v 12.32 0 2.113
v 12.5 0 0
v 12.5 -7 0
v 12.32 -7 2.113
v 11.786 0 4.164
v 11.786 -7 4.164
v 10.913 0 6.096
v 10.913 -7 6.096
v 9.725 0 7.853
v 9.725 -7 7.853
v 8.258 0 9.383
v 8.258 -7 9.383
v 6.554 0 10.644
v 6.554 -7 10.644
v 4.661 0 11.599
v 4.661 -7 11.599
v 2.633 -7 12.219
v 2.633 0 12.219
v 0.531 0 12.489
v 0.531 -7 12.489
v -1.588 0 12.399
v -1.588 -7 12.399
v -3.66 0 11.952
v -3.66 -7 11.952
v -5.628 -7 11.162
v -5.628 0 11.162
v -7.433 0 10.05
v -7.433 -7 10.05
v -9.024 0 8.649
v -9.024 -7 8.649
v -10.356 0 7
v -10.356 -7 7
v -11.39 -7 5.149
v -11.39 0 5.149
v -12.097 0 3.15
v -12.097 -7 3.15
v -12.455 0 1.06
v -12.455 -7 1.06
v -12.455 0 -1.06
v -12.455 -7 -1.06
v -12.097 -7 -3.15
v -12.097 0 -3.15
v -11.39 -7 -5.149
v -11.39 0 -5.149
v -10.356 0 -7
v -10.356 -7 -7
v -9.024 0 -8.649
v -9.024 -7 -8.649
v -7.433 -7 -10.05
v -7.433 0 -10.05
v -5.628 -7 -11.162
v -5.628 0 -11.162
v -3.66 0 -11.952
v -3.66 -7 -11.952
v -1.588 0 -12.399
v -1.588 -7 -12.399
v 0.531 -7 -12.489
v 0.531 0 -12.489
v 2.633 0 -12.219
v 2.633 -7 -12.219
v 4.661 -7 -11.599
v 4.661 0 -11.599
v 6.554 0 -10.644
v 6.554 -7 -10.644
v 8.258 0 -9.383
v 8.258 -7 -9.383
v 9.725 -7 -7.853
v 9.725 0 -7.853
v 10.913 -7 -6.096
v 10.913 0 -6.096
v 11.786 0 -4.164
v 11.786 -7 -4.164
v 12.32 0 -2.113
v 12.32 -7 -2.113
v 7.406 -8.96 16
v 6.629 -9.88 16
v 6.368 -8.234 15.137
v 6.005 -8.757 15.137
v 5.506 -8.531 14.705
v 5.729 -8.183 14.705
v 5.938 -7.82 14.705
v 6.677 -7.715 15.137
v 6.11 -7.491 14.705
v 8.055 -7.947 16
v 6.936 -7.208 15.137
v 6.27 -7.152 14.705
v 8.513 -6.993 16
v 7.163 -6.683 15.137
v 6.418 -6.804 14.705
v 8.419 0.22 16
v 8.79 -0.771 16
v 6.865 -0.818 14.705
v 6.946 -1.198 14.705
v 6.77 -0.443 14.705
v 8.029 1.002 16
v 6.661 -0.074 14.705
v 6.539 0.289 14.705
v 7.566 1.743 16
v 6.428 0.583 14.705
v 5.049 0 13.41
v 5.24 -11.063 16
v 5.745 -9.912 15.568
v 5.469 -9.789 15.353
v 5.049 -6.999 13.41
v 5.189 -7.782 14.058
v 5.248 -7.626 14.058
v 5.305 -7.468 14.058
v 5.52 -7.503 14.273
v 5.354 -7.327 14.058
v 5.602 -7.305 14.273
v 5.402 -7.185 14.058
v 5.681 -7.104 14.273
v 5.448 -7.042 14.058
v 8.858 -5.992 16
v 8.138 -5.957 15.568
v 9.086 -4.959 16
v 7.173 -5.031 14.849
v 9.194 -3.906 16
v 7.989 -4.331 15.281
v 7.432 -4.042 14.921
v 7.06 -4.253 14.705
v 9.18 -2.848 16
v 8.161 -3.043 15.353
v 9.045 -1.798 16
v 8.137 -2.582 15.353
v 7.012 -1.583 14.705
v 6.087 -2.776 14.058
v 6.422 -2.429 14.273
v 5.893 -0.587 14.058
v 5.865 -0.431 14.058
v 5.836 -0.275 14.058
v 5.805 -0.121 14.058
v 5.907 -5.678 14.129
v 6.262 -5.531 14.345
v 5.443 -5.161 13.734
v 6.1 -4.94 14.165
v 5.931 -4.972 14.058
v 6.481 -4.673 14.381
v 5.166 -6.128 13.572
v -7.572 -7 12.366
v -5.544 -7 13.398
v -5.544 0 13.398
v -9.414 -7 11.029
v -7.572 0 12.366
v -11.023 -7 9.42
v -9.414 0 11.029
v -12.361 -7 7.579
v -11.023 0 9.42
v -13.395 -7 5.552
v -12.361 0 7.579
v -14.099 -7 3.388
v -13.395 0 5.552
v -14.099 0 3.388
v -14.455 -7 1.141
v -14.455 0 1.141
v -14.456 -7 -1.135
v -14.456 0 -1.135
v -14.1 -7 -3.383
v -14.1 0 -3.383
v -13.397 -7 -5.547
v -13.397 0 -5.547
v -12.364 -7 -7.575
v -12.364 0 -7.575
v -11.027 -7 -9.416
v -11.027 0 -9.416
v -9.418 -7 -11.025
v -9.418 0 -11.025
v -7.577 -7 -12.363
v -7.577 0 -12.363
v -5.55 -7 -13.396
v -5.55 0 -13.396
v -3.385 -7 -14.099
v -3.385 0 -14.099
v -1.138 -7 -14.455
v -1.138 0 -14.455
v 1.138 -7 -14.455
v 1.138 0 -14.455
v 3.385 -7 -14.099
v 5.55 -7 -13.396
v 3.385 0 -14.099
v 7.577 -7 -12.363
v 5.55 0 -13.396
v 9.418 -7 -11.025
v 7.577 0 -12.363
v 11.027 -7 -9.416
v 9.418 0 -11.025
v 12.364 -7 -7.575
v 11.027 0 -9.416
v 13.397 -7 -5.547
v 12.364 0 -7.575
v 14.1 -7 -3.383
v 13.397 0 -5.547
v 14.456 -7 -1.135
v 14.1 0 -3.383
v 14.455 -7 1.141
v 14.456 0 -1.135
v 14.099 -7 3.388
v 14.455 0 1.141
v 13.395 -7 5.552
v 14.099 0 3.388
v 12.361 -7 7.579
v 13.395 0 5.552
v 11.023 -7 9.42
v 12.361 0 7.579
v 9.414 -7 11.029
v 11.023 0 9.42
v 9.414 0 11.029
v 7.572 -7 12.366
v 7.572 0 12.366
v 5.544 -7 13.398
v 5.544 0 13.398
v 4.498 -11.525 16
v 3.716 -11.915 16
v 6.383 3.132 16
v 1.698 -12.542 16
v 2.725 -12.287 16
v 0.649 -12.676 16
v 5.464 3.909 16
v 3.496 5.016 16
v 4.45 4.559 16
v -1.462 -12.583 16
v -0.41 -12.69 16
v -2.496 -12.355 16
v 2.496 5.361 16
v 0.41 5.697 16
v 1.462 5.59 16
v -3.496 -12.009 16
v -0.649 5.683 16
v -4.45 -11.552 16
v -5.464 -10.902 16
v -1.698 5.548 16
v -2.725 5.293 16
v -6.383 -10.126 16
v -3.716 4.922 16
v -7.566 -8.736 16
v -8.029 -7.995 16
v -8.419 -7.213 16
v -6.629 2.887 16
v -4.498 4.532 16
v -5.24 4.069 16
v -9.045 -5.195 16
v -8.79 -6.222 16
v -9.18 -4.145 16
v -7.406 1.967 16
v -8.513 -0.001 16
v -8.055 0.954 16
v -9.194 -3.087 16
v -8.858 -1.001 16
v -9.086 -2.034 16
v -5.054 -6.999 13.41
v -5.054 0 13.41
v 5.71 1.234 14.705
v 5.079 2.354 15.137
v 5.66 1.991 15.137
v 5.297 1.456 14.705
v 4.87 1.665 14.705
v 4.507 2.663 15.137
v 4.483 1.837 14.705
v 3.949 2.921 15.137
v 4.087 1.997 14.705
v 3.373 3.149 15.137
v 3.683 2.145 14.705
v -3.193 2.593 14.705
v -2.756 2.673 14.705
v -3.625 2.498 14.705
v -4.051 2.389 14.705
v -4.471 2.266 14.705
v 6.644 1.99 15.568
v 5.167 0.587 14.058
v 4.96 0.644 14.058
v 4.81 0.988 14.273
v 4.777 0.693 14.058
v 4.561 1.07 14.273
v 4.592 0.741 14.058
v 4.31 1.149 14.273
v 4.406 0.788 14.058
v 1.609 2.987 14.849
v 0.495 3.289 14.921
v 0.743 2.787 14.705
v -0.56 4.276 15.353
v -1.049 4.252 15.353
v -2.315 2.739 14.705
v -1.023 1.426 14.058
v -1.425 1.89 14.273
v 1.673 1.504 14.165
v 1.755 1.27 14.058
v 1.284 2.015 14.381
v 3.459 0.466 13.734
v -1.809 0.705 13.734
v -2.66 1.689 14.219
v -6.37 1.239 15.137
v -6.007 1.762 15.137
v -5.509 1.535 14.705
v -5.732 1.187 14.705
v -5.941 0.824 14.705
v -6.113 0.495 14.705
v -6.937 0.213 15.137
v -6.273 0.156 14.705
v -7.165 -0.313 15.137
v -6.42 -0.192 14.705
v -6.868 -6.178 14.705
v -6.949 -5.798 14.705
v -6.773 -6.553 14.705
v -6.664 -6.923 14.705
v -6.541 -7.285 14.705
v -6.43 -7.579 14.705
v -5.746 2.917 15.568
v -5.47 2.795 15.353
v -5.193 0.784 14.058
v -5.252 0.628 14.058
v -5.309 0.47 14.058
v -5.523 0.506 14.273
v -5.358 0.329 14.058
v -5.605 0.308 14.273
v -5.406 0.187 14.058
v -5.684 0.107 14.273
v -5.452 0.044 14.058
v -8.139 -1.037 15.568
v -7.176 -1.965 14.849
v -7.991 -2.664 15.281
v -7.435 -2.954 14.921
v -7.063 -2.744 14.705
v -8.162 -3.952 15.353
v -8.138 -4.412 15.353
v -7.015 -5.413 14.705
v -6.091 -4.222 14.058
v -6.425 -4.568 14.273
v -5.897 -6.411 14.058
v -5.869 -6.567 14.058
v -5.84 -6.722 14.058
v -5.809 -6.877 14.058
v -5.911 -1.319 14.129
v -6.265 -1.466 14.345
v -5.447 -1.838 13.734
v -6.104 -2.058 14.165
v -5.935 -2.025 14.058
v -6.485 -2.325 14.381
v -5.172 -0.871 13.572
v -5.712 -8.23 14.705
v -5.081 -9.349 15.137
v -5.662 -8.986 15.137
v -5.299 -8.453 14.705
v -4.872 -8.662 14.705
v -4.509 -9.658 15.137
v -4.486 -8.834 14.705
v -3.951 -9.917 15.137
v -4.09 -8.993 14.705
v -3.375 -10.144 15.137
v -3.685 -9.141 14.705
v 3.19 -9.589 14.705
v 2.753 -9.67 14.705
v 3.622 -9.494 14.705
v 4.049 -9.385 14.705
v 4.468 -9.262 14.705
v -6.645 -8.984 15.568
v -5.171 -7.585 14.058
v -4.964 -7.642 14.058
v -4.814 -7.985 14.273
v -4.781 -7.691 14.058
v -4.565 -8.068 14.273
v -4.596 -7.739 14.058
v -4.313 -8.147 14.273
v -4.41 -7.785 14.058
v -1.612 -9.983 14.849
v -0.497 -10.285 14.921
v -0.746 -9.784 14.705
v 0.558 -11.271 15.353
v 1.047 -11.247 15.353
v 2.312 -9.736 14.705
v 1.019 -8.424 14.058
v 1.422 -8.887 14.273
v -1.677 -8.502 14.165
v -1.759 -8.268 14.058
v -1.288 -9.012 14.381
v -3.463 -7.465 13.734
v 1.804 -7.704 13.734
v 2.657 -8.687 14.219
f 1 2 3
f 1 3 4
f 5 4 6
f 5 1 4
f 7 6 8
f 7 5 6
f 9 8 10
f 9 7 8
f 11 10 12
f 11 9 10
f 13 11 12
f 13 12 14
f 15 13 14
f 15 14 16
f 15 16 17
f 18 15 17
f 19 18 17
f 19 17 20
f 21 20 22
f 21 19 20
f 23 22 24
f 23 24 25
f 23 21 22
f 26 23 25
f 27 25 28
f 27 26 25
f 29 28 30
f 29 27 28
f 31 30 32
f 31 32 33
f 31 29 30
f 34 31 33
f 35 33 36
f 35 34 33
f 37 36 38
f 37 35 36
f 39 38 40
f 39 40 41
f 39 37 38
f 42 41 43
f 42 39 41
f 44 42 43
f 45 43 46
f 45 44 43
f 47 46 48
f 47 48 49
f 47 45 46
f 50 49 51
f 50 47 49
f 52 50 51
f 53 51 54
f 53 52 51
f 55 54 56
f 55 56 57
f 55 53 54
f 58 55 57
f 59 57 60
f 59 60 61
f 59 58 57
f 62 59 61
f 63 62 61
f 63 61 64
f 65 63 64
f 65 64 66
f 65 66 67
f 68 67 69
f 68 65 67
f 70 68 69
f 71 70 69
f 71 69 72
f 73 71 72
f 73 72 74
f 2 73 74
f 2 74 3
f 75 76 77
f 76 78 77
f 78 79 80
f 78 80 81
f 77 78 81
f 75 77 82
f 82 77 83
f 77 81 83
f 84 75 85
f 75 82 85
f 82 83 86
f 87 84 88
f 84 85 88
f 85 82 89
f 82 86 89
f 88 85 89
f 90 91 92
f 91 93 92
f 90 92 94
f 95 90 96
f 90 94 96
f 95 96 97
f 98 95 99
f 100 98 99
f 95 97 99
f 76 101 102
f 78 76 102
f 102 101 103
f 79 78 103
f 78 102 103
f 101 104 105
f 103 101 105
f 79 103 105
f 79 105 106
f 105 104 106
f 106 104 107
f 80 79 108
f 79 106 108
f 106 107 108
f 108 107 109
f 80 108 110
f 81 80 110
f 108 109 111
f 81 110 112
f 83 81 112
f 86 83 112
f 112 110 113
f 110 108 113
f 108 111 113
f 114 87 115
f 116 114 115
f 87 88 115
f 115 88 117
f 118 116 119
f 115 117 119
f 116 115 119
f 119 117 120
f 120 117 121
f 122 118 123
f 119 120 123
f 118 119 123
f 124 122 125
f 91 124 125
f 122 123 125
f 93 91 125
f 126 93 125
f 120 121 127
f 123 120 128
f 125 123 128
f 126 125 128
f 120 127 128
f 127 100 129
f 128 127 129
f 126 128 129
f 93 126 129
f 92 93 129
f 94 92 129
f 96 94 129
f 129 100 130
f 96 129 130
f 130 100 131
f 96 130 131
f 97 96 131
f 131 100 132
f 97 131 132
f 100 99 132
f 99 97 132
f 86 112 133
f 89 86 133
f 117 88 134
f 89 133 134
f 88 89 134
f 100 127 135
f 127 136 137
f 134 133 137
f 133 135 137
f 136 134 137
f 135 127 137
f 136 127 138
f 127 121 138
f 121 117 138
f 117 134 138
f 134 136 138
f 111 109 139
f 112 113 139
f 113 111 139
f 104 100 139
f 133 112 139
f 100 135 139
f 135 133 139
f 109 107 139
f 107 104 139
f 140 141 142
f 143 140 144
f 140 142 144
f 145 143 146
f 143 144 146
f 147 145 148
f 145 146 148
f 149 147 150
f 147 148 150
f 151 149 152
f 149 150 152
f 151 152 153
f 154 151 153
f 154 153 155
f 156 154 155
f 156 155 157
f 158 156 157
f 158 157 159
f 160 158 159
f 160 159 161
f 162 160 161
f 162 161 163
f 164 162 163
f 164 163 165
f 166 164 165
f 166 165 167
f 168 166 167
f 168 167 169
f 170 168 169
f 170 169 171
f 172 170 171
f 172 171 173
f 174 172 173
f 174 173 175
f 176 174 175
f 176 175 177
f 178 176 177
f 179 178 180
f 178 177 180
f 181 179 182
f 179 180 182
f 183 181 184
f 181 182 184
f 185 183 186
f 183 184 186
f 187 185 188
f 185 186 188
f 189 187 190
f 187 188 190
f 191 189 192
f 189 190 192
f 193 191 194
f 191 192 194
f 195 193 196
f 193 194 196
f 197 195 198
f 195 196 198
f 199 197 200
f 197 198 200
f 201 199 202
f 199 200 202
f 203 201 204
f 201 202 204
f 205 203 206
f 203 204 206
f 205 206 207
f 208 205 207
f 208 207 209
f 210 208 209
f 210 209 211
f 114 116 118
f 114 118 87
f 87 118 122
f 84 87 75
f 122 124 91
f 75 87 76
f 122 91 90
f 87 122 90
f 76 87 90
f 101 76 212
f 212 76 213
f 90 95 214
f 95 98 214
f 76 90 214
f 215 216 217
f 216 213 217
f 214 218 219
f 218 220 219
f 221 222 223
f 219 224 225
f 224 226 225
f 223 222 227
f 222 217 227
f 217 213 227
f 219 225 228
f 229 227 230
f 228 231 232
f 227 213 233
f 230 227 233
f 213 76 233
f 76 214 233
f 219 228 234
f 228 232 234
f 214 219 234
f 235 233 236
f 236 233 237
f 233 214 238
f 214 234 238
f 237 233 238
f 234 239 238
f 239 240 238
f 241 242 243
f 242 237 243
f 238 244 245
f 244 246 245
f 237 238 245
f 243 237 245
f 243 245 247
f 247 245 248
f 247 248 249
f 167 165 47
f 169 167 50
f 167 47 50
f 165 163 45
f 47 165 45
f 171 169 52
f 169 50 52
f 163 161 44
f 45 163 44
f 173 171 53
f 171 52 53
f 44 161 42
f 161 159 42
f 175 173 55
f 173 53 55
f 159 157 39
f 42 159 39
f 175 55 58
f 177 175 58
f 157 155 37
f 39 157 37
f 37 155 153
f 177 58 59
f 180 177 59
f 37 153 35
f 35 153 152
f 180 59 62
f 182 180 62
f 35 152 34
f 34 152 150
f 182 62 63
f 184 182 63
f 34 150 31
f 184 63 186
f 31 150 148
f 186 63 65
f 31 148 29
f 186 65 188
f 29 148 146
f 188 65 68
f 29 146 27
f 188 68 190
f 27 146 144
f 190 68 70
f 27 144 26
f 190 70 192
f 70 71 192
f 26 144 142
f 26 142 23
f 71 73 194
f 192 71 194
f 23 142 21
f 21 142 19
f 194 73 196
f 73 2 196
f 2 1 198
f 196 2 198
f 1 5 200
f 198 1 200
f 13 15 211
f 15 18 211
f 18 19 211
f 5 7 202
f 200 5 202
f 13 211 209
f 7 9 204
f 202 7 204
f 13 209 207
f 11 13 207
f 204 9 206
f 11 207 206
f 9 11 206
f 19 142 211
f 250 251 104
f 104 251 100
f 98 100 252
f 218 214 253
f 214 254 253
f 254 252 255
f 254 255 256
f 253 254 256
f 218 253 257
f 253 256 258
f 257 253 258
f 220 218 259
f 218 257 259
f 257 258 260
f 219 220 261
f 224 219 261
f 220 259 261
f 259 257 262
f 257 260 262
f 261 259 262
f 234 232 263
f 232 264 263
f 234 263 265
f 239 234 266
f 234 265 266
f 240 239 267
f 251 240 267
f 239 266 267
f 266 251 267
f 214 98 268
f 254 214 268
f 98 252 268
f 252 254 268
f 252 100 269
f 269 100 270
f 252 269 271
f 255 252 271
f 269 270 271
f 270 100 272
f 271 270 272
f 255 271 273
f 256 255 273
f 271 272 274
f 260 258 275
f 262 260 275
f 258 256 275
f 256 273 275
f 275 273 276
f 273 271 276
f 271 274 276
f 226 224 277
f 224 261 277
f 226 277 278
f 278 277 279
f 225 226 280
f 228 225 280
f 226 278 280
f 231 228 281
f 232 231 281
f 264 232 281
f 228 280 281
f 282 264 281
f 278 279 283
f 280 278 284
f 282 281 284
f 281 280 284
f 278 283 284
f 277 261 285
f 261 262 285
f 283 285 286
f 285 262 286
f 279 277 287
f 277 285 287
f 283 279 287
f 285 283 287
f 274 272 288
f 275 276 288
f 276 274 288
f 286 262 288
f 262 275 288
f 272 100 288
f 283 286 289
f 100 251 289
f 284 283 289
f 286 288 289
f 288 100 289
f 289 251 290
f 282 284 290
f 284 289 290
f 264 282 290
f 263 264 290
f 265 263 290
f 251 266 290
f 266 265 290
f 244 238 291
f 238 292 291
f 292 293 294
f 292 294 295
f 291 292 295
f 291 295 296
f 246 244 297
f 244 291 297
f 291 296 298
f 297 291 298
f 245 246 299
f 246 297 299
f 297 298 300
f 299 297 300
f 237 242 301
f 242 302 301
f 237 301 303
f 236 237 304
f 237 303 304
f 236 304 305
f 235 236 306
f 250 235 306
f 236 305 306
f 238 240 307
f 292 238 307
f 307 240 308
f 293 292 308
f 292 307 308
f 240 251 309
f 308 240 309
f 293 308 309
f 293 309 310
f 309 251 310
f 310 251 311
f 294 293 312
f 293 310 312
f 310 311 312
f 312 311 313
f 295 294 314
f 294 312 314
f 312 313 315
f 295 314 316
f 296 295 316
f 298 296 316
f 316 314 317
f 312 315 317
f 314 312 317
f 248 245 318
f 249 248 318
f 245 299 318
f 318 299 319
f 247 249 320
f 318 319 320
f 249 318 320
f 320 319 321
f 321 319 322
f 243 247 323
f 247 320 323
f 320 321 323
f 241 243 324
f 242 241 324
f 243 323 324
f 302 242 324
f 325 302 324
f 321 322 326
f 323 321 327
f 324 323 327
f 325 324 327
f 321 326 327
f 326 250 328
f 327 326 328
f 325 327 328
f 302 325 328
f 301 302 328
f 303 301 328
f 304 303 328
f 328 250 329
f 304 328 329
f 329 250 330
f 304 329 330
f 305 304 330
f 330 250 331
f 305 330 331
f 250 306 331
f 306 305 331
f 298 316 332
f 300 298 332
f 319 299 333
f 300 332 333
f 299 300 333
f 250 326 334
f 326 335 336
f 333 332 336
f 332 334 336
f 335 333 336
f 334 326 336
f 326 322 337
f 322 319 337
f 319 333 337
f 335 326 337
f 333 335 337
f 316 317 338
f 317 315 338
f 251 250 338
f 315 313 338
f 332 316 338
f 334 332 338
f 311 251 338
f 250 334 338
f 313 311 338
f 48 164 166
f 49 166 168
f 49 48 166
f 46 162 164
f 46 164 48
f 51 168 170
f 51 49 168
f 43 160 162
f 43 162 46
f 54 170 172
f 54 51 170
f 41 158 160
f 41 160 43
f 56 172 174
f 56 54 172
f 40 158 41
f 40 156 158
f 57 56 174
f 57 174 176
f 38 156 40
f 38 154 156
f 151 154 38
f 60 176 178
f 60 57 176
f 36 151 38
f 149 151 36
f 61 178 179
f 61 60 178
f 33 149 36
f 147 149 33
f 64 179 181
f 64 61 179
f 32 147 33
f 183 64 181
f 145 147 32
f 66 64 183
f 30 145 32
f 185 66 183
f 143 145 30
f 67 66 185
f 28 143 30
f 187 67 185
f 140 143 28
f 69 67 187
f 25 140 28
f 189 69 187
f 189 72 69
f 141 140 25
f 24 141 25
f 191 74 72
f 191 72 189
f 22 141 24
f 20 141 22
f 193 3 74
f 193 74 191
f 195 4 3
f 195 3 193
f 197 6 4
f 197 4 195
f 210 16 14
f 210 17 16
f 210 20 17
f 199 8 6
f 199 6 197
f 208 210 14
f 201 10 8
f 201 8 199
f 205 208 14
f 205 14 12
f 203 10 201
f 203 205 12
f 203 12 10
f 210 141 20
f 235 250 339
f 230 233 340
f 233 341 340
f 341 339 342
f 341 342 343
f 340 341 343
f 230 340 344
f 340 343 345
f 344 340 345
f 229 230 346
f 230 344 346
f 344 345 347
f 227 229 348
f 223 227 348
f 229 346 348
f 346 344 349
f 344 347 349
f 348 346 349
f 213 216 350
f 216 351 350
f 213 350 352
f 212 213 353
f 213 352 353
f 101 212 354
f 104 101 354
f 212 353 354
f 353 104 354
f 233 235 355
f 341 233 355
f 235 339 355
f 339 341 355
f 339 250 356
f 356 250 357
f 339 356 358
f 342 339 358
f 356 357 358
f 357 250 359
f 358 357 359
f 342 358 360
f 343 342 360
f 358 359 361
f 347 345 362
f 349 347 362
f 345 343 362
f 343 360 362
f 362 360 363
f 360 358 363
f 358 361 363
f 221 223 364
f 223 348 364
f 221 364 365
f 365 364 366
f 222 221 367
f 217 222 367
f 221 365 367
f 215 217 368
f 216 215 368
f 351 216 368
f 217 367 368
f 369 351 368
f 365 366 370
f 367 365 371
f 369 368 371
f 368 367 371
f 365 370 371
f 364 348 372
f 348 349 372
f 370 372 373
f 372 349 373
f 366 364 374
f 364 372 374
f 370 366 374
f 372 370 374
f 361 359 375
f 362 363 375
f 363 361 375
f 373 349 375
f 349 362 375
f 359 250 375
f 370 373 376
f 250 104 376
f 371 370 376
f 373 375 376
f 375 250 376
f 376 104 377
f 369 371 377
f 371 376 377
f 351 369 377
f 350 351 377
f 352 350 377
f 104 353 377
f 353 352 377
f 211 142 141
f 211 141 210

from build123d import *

# Parameters (mm, degrees)
F0_R     = 14.5
F0_R_2   = 12.5
F1_DEPTH = 7
F2_W     = 48.194617033
F2_H     = 4.0483484045
F3_DEPTH = 27.99757
F5_W     = 10.1034124382
F5_H     = 6.9993771613


# Not quite as in the source:
# - the arcs of a loft's sections are written as splines that run evenly, so that the points pair up as in the source's solid


with BuildPart() as f1:
    # F0 (on Front) → F1 (new body)
    with BuildSketch(Plane.XZ):
        Circle(F0_R)
        Circle(F0_R_2, mode=Mode.SUBTRACT)
    extrude(amount=F1_DEPTH)

    # F2 (on Front) → F3 (cut)
    with BuildSketch(Plane.XZ):
        with Locations((7.1328040212, 15.4222766869)):
            Rectangle(F2_W, F2_H)
    extrude(amount=F3_DEPTH, mode=Mode.SUBTRACT)


with BuildPart() as f8:
    # F7 (on offset) → F8 section 0
    with BuildSketch(Plane.XY.offset(16)):
        with BuildLine():
            add(Edge.make_bspline(
                [(7.565968402, 1.7430809523), (6.880091644, 2.7334639001), (5.9975628433, 3.5870814841), (3.9722215545, 4.89212321), (2.8302059518, 5.3430338738), (0.4596167417, 5.7736706573), (-0.76802414, 5.7532273399), (-3.1229605537, 5.2438986345), (-4.2493295187, 4.7552136457), (-5.2397124665, 4.0693368877)],
                knots=[0, 0, 0, 0, 0.25, 0.25, 0.5, 0.5, 0.75, 0.75, 1, 1, 1, 1], degree=3))
            add(Edge.make_bspline(
                [(-5.2397124665, 4.0693368877), (-6.2300954144, 3.3834601297), (-7.0837129984, 2.500931329), (-8.3887547243, 0.4755900402), (-8.8396653881, -0.6664255625), (-9.2703021716, -3.0370147726), (-9.2498588542, -4.2646556543), (-8.7405301488, -6.619592068), (-8.25184516, -7.745961033), (-7.565968402, -8.7363439808)],
                knots=[0, 0, 0, 0, 0.25, 0.25, 0.5, 0.5, 0.75, 0.75, 1, 1, 1, 1], degree=3))
            add(Edge.make_bspline(
                [(-7.565968402, -8.7363439808), (-6.880091644, -9.7267269287), (-5.9975628433, -10.5803445126), (-3.9722215545, -11.8853862386), (-2.8302059518, -12.3362969023), (-0.4596167417, -12.7669336859), (0.76802414, -12.7464903685), (3.1229605537, -12.2371616631), (4.2493295187, -11.7484766742), (5.2397124665, -11.0625999162)],
                knots=[0, 0, 0, 0, 0.25, 0.25, 0.5, 0.5, 0.75, 0.75, 1, 1, 1, 1], degree=3))
            add(Edge.make_bspline(
                [(5.2397124665, -11.0625999162), (6.2300954144, -10.3767231583), (7.0837129984, -9.4941943576), (8.3887547243, -7.4688530688), (8.8396653881, -6.326837466), (9.2703021716, -3.9562482559), (9.2498588542, -2.7286073742), (8.7405301488, -0.3736709606), (8.25184516, 0.7526980044), (7.565968402, 1.7430809523)],
                knots=[0, 0, 0, 0, 0.25, 0.25, 0.5, 0.5, 0.75, 0.75, 1, 1, 1, 1], degree=3))
        make_face()
    # F5 (on offset) → F8 section 1
    with BuildSketch(Plane.XY.offset(13.41)):
        with Locations((-0.0026880298, -3.4996885806)):
            Rectangle(F5_W, F5_H)
    loft(ruled=True)


solid = Compound([f1.part, f8.part])
